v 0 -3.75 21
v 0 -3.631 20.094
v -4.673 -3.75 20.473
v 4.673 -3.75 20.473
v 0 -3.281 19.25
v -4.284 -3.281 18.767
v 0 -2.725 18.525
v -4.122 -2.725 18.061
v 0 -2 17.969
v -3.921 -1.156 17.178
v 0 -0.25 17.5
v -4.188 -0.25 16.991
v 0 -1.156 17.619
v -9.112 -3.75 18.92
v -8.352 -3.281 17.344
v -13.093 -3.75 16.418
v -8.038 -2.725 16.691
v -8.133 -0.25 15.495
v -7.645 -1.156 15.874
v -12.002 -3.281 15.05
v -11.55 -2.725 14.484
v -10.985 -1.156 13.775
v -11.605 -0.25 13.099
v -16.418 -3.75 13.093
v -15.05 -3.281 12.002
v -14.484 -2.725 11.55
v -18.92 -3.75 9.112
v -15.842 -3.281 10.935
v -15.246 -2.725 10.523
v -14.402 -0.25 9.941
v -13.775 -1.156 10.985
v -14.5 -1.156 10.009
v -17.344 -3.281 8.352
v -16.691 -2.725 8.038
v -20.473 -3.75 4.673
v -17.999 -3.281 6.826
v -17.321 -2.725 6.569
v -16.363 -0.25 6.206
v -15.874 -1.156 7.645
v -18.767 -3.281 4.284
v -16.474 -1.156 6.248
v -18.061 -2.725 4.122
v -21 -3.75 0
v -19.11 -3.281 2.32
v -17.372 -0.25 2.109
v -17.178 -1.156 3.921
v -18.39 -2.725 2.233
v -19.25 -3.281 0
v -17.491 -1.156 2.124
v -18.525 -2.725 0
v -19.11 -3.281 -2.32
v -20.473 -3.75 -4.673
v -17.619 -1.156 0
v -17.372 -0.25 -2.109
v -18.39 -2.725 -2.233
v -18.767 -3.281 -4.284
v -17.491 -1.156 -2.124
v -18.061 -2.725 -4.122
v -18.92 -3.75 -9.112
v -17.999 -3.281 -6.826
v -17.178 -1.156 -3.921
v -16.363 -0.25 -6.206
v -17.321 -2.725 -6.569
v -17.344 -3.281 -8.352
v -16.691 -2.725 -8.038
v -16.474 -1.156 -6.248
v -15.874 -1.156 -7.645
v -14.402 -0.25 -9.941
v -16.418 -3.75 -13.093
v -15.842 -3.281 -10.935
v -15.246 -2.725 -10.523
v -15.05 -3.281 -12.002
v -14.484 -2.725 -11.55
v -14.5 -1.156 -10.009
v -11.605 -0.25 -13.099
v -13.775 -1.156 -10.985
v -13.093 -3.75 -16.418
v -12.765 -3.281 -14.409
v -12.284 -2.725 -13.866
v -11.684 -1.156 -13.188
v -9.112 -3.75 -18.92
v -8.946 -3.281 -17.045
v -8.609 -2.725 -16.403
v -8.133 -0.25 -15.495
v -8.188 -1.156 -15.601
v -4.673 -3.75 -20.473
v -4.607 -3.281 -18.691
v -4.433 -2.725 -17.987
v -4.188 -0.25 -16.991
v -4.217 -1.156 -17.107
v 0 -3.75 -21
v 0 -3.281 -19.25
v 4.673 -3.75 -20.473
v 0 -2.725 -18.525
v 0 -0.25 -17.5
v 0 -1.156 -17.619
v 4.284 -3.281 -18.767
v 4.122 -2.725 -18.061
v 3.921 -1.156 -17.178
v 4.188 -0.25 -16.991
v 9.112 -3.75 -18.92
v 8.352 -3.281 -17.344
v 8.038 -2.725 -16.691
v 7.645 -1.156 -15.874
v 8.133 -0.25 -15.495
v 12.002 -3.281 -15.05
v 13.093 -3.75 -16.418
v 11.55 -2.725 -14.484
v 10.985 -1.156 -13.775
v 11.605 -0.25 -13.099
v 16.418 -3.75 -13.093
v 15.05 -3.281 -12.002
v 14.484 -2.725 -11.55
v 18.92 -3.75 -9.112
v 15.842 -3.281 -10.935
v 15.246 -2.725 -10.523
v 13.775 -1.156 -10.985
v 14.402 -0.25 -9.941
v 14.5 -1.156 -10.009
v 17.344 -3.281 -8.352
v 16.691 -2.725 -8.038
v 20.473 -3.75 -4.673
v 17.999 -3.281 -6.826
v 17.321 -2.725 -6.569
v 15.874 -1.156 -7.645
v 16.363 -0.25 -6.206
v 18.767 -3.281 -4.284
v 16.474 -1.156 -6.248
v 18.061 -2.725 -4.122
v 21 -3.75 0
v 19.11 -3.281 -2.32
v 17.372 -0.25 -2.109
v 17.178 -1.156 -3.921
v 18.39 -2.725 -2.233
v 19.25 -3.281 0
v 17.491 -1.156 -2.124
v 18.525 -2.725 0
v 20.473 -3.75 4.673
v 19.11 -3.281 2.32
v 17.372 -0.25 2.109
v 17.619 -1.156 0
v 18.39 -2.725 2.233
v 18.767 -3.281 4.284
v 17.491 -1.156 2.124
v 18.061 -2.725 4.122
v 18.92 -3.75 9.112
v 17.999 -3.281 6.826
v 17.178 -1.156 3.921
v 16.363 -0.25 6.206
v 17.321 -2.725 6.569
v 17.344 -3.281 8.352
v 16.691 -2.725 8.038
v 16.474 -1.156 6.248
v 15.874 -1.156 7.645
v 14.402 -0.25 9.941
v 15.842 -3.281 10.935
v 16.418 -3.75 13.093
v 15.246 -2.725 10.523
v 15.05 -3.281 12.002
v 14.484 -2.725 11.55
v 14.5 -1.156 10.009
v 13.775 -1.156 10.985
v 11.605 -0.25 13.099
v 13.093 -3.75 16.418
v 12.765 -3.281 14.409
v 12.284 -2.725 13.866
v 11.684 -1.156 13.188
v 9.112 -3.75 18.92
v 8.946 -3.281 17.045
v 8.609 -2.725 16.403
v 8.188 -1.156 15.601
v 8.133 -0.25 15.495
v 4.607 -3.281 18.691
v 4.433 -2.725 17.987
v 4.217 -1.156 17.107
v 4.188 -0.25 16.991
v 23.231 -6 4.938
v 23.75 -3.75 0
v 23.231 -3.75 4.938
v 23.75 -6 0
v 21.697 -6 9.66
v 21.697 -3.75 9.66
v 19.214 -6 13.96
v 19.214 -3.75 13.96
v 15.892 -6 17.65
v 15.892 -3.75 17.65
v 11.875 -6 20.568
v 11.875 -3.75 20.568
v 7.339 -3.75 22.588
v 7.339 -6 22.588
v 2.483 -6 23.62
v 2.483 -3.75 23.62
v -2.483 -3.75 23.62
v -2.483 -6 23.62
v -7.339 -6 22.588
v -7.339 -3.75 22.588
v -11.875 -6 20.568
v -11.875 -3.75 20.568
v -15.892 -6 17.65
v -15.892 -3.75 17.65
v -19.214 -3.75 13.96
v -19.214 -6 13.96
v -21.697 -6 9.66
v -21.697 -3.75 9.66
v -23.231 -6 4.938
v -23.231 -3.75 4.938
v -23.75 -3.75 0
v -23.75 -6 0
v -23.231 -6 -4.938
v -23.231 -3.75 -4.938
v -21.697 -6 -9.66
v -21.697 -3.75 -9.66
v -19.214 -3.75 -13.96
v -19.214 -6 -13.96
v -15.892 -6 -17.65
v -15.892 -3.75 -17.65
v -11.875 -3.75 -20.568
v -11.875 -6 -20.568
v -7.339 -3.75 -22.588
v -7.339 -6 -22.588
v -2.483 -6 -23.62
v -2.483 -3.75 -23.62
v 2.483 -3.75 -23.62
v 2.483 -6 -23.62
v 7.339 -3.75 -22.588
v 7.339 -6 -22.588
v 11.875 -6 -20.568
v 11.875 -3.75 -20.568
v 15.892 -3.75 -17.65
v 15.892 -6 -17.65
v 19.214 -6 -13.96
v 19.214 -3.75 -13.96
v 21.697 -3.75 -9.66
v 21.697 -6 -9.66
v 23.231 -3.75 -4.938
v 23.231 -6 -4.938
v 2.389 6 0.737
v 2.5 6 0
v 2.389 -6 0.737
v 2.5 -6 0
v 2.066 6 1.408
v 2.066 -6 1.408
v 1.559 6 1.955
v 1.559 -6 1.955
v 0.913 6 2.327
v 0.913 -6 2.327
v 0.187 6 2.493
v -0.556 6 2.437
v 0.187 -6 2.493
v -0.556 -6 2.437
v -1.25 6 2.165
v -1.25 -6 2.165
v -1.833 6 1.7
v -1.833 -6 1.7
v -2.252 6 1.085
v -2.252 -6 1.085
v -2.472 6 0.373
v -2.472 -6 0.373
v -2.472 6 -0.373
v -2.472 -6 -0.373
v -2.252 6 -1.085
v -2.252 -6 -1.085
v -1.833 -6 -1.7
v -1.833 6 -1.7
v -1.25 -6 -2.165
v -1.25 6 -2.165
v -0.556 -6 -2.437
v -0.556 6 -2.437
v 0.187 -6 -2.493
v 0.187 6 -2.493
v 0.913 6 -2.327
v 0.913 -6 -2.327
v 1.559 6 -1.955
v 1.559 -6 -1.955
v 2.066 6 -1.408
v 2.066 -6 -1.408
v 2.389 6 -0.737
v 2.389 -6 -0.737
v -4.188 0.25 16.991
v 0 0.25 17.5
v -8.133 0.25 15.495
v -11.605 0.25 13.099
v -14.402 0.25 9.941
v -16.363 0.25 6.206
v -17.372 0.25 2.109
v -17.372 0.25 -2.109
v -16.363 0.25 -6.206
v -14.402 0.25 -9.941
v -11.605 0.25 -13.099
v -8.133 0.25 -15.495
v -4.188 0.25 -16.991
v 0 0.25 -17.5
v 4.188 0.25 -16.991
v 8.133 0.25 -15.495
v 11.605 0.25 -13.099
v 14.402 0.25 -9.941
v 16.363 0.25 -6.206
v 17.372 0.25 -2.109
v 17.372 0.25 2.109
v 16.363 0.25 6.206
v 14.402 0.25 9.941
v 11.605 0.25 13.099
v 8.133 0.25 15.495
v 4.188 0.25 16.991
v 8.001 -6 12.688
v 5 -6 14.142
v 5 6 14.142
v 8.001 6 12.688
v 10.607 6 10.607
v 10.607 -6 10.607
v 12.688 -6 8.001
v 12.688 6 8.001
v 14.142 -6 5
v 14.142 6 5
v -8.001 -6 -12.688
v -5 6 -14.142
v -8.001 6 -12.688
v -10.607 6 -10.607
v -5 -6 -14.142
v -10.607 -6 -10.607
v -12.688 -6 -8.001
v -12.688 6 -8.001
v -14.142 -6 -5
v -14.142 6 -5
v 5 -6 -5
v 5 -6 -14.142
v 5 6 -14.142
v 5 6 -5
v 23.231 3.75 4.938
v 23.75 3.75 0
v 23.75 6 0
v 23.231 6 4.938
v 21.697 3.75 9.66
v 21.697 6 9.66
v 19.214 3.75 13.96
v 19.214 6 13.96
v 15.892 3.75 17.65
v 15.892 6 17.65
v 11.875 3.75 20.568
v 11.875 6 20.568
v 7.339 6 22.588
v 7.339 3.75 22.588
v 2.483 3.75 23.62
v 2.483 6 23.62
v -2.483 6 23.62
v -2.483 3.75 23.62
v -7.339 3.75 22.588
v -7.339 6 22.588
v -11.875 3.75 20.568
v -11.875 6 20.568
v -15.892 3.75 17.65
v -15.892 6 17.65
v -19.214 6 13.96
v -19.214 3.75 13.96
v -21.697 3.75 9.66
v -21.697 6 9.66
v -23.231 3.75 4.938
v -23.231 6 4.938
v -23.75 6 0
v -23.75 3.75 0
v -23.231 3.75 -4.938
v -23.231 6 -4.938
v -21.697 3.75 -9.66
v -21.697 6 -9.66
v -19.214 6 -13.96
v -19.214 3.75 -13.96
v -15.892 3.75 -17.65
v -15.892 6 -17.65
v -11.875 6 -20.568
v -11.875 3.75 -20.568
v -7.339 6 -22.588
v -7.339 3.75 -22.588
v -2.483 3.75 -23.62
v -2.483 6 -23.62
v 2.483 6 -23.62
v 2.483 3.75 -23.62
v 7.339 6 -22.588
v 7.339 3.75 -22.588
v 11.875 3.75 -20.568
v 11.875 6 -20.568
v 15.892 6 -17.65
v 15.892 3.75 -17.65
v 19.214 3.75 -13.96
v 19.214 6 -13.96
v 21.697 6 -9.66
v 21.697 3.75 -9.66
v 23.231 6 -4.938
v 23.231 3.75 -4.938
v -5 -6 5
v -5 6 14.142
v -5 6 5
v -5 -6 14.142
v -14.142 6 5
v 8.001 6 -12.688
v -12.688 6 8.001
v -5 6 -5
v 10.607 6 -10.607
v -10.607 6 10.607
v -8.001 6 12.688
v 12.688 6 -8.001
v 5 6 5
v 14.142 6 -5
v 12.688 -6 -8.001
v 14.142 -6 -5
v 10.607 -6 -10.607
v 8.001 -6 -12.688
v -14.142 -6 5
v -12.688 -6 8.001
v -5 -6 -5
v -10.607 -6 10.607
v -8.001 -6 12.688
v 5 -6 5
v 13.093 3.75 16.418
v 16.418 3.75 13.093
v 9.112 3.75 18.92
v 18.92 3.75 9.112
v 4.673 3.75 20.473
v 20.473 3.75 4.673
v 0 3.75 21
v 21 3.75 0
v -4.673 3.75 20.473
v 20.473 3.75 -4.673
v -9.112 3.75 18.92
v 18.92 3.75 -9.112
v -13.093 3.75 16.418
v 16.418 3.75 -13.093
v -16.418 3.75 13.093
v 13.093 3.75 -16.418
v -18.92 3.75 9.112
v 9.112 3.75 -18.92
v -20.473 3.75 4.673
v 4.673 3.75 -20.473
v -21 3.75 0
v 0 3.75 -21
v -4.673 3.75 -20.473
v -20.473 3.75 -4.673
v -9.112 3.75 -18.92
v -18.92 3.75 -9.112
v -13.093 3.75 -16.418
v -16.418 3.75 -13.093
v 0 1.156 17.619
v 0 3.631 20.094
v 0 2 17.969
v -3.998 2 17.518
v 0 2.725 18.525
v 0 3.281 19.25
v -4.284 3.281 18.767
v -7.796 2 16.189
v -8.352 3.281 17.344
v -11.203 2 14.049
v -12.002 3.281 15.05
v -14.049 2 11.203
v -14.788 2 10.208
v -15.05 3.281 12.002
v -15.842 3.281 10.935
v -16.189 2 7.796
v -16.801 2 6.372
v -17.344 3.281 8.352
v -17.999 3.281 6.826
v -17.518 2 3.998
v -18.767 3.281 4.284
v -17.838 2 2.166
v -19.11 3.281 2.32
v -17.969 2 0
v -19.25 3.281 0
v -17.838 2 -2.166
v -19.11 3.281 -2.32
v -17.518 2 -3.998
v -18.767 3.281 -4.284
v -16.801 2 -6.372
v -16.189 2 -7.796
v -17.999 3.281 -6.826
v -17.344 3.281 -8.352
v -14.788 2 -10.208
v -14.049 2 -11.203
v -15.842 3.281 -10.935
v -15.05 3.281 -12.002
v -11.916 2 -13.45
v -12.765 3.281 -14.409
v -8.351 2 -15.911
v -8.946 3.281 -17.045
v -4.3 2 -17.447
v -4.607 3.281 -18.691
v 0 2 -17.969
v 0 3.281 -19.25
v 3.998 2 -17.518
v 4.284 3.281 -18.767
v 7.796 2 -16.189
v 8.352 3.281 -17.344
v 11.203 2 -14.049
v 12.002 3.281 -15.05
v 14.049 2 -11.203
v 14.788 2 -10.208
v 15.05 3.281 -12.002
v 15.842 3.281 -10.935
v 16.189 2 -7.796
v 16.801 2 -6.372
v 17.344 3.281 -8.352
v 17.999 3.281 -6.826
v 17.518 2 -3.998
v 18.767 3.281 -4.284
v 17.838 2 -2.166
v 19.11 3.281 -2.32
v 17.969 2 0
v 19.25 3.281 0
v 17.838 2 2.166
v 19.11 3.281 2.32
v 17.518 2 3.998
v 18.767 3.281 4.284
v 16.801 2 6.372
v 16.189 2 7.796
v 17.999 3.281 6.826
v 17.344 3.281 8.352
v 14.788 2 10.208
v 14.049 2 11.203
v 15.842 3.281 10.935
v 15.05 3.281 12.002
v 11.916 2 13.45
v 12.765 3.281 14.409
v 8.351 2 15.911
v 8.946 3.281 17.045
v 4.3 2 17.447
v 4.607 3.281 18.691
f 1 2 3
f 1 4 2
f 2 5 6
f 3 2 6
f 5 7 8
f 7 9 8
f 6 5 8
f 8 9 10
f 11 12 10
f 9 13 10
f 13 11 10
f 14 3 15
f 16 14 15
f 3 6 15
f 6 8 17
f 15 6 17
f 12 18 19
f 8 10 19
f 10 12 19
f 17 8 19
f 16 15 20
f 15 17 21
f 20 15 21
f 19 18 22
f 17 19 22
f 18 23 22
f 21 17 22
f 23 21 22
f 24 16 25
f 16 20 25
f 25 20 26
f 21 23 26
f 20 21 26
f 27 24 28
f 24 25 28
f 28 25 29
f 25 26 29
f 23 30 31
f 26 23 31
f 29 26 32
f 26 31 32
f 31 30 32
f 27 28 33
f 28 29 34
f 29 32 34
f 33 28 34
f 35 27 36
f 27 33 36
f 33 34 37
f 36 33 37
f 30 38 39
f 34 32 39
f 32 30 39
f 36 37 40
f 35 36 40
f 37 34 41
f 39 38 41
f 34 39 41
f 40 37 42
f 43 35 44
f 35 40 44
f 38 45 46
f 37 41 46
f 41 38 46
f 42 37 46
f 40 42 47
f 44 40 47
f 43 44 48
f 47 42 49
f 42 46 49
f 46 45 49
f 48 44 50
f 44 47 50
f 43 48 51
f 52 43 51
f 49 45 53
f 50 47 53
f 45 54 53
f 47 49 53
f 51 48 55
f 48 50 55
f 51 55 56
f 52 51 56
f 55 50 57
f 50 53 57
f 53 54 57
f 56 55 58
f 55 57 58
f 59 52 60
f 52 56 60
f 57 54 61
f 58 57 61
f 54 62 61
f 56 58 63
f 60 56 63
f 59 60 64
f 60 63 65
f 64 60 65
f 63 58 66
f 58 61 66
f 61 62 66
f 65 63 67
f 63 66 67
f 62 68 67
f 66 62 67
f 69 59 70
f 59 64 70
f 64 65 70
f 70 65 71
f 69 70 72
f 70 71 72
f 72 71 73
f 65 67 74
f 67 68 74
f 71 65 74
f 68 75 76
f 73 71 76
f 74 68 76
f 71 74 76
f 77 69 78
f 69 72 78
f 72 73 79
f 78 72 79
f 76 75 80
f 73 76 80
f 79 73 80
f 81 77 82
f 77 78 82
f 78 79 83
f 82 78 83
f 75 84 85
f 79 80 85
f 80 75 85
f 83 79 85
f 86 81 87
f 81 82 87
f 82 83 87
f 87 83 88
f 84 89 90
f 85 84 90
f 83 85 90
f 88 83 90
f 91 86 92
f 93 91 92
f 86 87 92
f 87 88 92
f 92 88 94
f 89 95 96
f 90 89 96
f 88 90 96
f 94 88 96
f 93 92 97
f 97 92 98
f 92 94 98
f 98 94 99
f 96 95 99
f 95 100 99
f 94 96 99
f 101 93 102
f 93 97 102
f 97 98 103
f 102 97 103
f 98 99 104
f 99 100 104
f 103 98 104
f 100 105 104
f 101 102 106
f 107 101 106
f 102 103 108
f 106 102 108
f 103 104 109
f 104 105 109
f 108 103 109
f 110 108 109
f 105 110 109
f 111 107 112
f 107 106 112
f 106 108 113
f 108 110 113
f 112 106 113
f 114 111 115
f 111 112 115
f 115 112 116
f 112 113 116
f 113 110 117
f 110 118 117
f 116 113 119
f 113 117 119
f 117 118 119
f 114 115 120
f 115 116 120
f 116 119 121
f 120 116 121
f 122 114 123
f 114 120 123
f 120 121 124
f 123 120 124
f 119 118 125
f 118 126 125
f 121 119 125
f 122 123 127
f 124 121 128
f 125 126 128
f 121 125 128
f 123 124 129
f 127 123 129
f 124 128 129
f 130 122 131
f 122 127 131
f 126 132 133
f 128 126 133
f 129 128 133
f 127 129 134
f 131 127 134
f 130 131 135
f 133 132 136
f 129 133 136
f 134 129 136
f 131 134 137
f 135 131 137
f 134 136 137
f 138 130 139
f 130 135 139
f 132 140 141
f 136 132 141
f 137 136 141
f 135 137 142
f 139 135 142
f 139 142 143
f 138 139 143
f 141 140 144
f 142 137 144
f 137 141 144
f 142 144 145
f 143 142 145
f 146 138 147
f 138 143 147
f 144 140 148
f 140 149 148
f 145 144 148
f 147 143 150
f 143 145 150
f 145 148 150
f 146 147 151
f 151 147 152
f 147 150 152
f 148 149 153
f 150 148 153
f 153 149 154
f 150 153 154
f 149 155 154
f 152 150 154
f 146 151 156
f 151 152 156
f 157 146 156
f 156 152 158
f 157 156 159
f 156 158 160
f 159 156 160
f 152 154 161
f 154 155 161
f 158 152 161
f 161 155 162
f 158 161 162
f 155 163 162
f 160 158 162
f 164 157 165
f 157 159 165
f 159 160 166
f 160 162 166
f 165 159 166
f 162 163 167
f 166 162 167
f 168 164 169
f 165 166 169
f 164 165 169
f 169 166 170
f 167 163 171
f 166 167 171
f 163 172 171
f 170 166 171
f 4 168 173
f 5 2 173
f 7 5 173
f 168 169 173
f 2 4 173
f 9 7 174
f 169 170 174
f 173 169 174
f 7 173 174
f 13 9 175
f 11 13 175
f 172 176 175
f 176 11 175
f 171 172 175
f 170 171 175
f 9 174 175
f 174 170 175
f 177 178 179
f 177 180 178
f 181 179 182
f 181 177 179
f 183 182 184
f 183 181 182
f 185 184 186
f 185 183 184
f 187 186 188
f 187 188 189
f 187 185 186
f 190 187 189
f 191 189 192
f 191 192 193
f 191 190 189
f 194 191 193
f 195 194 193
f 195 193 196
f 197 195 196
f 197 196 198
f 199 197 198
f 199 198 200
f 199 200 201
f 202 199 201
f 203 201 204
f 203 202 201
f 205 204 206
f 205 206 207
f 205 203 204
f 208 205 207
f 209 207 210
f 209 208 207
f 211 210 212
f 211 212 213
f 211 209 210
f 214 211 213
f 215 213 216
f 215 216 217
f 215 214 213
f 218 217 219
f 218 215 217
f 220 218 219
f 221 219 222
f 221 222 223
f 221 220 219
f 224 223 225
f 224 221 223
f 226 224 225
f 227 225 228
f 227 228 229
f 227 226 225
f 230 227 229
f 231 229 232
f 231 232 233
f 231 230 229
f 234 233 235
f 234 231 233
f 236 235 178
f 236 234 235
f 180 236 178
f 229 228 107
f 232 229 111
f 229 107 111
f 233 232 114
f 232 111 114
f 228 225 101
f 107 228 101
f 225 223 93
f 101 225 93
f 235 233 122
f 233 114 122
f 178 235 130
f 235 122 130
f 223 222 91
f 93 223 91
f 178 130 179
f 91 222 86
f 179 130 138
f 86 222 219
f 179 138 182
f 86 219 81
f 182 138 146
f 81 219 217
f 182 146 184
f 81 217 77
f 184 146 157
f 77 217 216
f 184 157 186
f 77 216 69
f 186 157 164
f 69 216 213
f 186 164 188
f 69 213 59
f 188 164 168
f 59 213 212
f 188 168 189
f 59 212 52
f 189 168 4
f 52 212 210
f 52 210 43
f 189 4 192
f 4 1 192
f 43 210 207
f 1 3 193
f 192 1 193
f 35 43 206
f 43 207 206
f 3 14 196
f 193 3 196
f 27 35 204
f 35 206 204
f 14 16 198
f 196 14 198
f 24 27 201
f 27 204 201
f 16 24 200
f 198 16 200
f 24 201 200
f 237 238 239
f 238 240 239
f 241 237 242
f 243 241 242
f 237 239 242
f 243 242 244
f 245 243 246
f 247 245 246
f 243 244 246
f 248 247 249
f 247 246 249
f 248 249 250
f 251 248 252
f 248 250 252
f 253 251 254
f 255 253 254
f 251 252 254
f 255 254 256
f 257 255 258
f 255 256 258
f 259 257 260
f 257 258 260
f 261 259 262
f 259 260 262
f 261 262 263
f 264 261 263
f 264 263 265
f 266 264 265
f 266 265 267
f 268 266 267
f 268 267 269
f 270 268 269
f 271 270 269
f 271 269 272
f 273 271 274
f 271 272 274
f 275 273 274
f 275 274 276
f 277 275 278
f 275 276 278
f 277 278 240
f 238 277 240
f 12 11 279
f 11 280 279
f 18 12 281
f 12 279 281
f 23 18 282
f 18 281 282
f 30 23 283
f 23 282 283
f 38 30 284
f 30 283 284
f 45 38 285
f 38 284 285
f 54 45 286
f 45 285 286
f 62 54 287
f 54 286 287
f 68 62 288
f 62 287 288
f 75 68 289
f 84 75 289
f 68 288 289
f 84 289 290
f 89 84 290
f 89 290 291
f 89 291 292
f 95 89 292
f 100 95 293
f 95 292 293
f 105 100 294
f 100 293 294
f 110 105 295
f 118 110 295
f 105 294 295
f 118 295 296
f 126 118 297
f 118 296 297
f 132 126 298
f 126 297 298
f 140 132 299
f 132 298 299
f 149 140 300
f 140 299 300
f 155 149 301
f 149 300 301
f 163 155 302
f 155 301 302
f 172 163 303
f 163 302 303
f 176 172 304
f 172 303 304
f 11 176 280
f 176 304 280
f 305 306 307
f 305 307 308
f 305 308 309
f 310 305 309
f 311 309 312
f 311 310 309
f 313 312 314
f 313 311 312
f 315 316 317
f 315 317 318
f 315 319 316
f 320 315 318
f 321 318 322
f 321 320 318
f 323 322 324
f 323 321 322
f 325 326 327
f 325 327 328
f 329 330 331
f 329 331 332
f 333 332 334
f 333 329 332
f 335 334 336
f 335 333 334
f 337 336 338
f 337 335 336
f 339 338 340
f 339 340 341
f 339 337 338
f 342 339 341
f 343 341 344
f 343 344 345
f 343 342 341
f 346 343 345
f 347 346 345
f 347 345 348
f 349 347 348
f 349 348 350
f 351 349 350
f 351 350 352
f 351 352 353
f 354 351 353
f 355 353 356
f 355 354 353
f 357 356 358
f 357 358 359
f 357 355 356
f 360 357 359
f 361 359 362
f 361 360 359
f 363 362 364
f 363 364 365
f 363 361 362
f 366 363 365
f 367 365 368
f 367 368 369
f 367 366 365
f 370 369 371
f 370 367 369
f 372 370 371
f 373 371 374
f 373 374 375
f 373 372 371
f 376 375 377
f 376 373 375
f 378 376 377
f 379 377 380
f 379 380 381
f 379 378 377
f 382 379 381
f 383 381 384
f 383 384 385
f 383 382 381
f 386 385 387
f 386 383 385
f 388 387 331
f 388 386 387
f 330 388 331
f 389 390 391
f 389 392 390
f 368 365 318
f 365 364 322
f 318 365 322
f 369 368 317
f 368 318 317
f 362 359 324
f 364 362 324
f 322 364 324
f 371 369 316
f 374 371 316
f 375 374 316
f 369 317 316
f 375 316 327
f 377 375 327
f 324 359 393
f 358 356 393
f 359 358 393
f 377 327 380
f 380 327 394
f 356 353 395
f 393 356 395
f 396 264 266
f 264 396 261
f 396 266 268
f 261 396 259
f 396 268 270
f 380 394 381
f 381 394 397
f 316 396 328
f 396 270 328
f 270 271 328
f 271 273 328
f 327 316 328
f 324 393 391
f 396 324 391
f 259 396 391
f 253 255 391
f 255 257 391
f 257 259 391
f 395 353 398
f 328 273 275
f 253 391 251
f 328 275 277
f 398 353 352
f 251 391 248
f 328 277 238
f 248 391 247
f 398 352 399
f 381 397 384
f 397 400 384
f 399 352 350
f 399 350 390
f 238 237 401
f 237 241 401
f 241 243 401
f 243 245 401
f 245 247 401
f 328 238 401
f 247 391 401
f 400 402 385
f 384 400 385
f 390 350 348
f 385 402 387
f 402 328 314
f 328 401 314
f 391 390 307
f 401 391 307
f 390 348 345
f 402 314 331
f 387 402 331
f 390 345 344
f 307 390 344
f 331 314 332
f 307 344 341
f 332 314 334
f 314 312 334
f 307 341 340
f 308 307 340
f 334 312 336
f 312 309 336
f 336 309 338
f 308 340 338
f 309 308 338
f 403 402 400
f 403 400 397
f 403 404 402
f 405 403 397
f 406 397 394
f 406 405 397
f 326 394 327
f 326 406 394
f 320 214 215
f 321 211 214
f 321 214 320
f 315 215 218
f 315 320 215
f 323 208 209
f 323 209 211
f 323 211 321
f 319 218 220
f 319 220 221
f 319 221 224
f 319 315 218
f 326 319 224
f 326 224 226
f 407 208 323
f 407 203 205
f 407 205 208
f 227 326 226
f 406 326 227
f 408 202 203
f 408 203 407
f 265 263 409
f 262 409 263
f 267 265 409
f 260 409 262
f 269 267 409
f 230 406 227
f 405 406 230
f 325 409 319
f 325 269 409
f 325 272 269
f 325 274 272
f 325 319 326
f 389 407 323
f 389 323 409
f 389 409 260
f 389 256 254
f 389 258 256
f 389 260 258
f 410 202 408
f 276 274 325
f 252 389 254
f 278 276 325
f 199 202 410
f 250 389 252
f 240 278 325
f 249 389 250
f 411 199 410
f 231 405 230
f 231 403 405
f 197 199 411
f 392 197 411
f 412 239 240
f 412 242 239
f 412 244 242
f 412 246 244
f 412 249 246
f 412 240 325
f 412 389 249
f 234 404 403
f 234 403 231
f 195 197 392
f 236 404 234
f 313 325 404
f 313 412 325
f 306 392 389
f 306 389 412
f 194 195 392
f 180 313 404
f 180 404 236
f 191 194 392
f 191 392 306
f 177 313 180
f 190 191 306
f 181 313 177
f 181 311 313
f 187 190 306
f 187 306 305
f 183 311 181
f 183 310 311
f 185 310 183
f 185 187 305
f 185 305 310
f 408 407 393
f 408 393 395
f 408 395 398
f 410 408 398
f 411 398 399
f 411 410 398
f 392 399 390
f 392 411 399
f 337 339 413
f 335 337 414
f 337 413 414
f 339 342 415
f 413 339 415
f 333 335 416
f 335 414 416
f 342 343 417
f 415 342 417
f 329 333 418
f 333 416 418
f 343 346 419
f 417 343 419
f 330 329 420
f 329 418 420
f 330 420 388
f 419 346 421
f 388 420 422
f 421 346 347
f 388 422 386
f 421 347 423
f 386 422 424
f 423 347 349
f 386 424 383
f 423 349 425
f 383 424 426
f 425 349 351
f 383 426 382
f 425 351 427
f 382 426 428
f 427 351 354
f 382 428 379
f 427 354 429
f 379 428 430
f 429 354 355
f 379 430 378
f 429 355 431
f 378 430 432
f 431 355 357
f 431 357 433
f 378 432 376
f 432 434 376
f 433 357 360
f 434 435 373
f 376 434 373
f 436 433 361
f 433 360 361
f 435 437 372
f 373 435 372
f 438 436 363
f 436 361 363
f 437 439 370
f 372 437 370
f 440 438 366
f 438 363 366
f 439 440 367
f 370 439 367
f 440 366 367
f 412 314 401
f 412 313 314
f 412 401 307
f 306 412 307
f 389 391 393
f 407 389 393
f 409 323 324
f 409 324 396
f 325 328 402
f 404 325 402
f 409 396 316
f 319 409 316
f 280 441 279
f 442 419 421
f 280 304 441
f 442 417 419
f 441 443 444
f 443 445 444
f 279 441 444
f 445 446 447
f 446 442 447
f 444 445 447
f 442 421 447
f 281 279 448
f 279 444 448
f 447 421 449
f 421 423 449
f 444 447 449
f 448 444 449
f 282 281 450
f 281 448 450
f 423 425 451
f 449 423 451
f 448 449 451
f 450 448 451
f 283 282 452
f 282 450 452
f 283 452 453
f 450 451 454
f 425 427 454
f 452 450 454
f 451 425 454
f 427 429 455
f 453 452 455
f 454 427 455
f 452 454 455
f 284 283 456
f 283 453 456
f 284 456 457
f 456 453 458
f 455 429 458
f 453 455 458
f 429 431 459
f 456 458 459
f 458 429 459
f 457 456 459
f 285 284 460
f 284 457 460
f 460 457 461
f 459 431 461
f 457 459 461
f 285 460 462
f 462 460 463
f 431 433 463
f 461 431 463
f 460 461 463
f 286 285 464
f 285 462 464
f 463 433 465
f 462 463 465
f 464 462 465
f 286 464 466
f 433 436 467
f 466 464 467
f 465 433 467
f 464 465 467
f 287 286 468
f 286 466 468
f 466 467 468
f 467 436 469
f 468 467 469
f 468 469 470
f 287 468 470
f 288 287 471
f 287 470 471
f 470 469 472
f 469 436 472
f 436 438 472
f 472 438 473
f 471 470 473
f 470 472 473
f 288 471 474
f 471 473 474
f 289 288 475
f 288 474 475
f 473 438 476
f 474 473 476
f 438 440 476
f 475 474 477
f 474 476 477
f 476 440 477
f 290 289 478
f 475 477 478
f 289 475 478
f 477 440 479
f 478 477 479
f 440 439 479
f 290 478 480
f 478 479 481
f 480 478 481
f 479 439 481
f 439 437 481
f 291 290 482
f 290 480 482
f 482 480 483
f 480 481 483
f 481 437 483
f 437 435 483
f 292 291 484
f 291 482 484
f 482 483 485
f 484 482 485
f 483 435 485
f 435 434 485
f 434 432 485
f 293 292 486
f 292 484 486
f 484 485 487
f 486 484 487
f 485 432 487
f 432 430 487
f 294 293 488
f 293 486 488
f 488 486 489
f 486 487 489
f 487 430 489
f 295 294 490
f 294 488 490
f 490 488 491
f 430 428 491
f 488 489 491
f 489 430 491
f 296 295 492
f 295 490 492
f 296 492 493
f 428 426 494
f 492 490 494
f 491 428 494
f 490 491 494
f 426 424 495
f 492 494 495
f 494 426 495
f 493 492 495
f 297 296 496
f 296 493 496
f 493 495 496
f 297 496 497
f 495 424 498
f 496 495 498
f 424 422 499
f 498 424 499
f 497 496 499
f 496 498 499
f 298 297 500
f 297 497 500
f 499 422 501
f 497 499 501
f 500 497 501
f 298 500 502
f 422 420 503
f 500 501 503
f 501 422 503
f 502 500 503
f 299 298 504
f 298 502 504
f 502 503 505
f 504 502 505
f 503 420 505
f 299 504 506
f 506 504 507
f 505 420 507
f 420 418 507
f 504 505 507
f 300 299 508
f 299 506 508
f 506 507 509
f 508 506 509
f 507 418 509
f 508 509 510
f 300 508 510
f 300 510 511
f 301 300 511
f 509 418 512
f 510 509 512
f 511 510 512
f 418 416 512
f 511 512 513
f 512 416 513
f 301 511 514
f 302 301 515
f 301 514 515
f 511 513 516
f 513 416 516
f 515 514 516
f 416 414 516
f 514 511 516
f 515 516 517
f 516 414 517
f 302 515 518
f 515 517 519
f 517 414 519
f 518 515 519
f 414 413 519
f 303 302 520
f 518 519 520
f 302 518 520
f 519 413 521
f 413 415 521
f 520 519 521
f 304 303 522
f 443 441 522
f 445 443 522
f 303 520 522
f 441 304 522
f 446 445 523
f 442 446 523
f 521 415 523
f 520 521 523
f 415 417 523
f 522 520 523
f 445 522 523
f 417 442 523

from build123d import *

# Parameters (mm, degrees)
F0_R     = 23.75
F0_W     = 10
F0_H     = 10
F3_DEPTH = 6
F5_R     = 2.5
F6_DEPTH = 12.5


with BuildPart() as f3:
    # F0 (on Front) → F3 (new body, symmetric)
    with BuildSketch(Plane.XZ):
        Circle(F0_R)
        with BuildLine():
            ThreePointArc((14.1421356237, 5), (14.7839783948, 2.5365296809), (15, 0))
            ThreePointArc((15, 0), (14.7839783948, -2.5365296809), (14.1421356237, -5))
            ThreePointArc((14.1421356237, -5), (10.6066017178, -10.6066017178), (5, -14.1421356237))
            ThreePointArc((5, -14.1421356237), (0, -15), (-5, -14.1421356237))
            ThreePointArc((-5, -14.1421356237), (-10.6066017178, -10.6066017178), (-14.1421356237, -5))
            ThreePointArc((-14.1421356237, -5), (-15, 0), (-14.1421356237, 5))
            ThreePointArc((-14.1421356237, 5), (-10.6066017178, 10.6066017178), (-5, 14.1421356237))
            ThreePointArc((-5, 14.1421356237), (0, 15), (5, 14.1421356237))
            ThreePointArc((5, 14.1421356237), (10.6066017178, 10.6066017178), (14.1421356237, 5))
        make_face(mode=Mode.SUBTRACT)
        with BuildLine():
            Line((5, 5), (5, 14.1421356237))
            ThreePointArc((5, 14.1421356237), (0, 15), (-5, 14.1421356237))
            Line((-5, 14.1421356237), (-5, 5))
            Line((-5, 5), (5, 5))
        make_face()
        with BuildLine():
            ThreePointArc((14.1421356237, -5), (14.7839783948, -2.5365296809), (15, 0))
            ThreePointArc((15, 0), (14.7839783948, 2.5365296809), (14.1421356237, 5))
            Line((14.1421356237, 5), (5, 5))
            Line((5, 5), (5, -5))
            Line((5, -5), (14.1421356237, -5))
        make_face()
        Rectangle(F0_W, F0_H)
        with BuildLine():
            Line((-5, -5), (-5, 5))
            Line((-5, 5), (-14.1421356237, 5))
            ThreePointArc((-14.1421356237, 5), (-15, 0), (-14.1421356237, -5))
            Line((-14.1421356237, -5), (-5, -5))
        make_face()
        with BuildLine():
            ThreePointArc((-5, -14.1421356237), (0, -15), (5, -14.1421356237))
            Line((5, -14.1421356237), (5, -5))
            Line((5, -5), (-5, -5))
            Line((-5, -5), (-5, -14.1421356237))
        make_face()
    extrude(amount=F3_DEPTH, both=True)

    # F1 (on Right) → F4 (revolve, cut)
    with BuildSketch(Plane.YZ):
        with BuildLine():
            Line((3.75, 21), (3.75, 25))
            Line((3.75, 25), (-3.75, 25))
            Line((-3.75, 25), (-3.75, 21))
            ThreePointArc((-3.75, 21), (-2.7248737342, 18.5251262658), (-0.25, 17.5))
            Line((-0.25, 17.5), (0.25, 17.5))
            ThreePointArc((0.25, 17.5), (2.7248737342, 18.5251262658), (3.75, 21))
        make_face()
    revolve(axis=Axis((0, -2.0112972707, 0), (0, -1, 0)), mode=Mode.SUBTRACT)

    # F5 (on Front) → F6 (cut, symmetric)
    with BuildSketch(Plane.XZ):
        Circle(F5_R)
    extrude(amount=F6_DEPTH, both=True, mode=Mode.SUBTRACT)


solid = f3.part
